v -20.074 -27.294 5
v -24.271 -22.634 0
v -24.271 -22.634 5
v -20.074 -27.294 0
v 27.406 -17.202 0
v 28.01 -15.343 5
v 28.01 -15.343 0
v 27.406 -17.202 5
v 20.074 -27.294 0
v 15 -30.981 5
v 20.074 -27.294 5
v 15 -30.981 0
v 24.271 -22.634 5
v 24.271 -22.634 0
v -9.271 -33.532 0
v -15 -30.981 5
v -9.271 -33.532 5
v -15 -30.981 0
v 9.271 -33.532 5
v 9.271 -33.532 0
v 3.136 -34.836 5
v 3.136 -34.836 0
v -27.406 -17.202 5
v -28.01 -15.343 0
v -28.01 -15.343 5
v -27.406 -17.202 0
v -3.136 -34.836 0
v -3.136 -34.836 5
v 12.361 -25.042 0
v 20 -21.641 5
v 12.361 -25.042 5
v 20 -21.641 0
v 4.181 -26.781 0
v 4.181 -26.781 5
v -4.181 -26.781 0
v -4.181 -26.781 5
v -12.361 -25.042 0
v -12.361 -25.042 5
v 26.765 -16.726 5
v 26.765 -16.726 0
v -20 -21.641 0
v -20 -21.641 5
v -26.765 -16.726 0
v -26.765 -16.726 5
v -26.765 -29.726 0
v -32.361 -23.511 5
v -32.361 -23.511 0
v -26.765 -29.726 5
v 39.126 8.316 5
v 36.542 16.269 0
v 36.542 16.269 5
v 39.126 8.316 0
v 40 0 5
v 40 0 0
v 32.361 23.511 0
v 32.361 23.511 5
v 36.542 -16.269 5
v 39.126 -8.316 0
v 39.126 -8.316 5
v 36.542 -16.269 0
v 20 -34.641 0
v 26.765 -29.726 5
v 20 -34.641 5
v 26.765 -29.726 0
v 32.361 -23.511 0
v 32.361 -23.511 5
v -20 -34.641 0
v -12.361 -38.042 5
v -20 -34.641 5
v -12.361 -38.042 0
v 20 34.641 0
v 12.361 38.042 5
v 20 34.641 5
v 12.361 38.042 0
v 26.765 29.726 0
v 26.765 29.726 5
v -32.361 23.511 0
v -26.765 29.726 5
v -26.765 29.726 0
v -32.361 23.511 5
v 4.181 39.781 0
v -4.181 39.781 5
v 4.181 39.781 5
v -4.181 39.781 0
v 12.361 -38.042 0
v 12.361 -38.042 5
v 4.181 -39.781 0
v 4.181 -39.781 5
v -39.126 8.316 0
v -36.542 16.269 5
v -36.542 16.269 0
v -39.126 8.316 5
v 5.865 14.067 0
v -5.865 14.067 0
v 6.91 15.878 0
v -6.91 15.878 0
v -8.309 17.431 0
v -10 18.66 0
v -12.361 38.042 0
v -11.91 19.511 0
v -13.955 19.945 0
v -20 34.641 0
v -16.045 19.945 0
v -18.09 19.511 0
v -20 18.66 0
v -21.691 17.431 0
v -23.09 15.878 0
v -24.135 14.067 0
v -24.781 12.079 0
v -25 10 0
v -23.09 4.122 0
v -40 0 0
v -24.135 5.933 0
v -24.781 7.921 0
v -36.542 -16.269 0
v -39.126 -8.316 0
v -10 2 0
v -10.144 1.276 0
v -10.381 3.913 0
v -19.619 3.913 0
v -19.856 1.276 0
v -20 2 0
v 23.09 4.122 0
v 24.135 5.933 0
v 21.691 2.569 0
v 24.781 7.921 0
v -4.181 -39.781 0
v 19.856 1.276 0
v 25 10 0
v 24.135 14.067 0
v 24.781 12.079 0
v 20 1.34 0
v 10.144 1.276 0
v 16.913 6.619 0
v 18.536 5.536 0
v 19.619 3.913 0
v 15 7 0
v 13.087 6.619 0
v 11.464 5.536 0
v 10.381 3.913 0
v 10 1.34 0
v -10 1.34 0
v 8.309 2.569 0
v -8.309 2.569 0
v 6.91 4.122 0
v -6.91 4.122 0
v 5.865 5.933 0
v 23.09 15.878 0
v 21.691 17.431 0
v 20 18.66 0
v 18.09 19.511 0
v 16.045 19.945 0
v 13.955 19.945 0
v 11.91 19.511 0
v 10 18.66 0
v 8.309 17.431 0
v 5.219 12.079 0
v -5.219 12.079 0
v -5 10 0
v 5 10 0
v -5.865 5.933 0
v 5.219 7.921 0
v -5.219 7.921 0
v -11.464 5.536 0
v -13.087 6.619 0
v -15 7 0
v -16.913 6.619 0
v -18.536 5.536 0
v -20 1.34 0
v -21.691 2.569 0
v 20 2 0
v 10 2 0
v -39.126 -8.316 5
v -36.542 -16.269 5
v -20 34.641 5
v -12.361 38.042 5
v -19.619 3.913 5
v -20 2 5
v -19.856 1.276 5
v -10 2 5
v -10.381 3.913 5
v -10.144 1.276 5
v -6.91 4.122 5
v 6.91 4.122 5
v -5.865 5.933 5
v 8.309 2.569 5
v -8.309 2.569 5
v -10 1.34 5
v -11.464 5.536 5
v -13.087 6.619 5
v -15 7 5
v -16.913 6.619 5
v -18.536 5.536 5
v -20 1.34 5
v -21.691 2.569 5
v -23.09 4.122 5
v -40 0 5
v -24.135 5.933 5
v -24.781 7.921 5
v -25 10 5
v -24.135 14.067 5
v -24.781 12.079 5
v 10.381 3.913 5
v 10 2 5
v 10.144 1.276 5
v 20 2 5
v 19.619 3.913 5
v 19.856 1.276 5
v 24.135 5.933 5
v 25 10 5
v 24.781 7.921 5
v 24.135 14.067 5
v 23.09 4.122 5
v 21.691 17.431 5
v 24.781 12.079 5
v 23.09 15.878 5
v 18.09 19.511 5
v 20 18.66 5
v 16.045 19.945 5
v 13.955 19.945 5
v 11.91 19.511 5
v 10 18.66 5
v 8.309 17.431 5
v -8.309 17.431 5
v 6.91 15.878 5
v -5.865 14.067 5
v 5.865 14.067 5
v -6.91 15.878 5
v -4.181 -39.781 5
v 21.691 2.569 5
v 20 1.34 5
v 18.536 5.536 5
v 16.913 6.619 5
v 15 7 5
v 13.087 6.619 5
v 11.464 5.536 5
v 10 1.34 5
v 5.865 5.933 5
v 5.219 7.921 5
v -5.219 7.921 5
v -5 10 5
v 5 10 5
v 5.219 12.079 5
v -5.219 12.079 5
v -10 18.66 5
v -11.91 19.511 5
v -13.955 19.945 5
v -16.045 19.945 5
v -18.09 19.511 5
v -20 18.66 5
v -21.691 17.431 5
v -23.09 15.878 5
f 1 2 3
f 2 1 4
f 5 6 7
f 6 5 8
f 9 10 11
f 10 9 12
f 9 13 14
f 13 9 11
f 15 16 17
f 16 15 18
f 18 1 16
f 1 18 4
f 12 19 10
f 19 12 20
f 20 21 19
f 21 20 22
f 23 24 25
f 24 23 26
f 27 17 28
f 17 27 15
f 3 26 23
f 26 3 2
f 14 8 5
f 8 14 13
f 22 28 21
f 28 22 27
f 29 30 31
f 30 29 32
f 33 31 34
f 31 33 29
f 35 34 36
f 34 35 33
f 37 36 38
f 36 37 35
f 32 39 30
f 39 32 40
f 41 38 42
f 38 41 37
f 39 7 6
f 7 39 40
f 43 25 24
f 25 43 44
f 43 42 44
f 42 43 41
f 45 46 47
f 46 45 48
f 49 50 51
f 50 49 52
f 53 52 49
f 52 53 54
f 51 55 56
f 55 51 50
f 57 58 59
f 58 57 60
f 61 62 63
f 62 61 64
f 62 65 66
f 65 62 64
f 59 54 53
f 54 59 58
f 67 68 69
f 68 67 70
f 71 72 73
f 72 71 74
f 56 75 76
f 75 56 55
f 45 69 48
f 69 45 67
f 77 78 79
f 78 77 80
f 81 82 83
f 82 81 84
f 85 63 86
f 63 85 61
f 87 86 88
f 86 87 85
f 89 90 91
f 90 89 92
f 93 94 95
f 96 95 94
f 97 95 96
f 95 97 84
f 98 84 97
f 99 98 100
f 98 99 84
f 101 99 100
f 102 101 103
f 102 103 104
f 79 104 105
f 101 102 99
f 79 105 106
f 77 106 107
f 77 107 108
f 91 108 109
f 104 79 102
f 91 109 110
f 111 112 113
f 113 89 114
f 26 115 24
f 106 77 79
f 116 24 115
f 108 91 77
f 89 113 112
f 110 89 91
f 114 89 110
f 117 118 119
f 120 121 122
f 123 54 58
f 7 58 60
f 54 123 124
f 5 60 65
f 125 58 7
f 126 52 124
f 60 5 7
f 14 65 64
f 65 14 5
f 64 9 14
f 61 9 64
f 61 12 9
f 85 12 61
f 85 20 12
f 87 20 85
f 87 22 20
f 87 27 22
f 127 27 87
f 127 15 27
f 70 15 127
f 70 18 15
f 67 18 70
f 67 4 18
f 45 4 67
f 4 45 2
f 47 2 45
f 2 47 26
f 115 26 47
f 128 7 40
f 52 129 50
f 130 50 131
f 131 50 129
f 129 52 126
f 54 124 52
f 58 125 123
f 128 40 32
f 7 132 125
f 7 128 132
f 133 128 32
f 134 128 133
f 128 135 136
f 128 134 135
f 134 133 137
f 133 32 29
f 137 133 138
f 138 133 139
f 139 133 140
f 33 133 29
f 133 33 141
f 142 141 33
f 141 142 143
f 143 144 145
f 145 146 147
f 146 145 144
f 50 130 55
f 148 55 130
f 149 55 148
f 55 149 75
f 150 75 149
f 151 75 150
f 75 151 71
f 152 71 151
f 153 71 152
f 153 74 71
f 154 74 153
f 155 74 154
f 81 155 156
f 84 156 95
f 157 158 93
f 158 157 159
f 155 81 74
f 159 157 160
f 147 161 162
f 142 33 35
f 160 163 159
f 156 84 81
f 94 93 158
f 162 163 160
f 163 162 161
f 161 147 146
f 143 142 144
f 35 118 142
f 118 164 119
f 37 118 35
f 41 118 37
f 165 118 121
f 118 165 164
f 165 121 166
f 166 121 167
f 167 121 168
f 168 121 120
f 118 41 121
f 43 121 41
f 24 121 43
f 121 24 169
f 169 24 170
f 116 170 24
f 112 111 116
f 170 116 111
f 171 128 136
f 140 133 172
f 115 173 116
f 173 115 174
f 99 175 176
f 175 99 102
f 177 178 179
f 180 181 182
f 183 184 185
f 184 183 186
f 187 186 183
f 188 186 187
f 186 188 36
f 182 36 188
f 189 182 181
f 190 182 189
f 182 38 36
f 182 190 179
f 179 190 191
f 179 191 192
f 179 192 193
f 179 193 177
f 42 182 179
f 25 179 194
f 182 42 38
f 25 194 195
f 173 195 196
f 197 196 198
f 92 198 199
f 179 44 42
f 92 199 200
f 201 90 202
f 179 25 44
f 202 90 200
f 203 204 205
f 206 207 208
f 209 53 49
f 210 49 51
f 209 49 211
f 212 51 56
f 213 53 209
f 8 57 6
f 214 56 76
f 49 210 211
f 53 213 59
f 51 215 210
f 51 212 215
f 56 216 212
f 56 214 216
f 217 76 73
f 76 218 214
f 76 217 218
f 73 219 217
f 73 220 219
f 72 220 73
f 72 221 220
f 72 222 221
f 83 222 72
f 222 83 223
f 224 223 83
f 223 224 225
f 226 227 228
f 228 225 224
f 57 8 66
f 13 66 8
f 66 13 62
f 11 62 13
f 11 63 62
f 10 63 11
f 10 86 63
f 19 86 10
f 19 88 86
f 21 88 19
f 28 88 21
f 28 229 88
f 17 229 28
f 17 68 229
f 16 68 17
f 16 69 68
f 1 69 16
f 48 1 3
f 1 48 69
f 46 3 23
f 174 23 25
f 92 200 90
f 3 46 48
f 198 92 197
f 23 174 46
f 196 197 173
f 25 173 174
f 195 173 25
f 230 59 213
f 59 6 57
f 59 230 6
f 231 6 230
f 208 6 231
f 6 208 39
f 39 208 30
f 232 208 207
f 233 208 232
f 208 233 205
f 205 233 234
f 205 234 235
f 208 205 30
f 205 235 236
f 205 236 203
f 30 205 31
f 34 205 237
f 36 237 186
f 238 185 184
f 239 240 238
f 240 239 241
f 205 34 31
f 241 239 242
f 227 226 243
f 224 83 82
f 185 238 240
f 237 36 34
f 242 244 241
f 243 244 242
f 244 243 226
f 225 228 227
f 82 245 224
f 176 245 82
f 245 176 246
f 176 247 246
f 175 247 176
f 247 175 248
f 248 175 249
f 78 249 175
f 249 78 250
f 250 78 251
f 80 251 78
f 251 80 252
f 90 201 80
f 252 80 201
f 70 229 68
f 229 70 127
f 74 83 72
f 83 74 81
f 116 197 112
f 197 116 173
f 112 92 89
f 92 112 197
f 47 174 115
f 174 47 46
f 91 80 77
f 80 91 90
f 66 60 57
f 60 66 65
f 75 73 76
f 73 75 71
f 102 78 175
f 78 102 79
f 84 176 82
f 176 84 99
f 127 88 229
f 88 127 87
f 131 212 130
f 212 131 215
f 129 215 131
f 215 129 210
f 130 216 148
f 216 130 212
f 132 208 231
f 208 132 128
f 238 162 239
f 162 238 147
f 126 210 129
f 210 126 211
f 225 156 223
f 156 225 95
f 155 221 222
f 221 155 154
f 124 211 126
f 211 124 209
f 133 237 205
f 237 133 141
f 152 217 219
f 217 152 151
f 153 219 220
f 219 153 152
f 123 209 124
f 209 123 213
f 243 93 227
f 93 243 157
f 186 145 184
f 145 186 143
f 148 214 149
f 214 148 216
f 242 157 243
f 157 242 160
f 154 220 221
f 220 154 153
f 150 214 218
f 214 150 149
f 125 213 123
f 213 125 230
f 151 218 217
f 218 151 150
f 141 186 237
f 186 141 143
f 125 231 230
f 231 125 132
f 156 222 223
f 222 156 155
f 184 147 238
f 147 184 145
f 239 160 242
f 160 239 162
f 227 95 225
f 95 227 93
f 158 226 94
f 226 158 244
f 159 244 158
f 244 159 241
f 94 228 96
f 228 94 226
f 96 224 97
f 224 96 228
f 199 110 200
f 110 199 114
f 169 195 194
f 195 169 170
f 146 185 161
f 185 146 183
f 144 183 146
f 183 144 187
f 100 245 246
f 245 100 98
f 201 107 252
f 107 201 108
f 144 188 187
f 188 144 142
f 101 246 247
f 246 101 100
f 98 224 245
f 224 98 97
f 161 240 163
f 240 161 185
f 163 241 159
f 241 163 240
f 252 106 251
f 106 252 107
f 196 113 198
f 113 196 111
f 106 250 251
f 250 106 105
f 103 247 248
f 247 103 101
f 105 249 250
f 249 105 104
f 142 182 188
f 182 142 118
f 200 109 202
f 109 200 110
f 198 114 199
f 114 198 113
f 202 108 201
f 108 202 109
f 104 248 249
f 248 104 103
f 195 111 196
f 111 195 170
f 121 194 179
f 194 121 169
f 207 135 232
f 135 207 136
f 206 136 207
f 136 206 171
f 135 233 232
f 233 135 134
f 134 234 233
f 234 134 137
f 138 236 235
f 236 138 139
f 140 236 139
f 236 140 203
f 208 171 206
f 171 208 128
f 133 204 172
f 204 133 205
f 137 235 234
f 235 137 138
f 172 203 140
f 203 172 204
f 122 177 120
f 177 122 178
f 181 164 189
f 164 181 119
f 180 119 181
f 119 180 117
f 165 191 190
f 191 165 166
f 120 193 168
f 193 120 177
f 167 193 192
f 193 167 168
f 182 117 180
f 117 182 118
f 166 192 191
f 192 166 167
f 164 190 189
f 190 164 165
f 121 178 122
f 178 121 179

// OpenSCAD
//3D Shapes- Smiley Face

//face
difference(){
    cylinder(5, 40, 40);
    
    translate([15,10,-1]) cylinder(7, 10, 10);
    translate([-15,10,-1]) cylinder(7, 10, 10);
    
    difference(){
      translate([0,-5,-1]) cylinder(7, 30, 30);
      translate([0,13,-2]) cylinder(9, 40, 40);
    }//mouth
}

//eyes
translate([15,2,0]) cylinder(5, 5, 5);
translate([-15,2,0]) cylinder(5, 5, 5);
